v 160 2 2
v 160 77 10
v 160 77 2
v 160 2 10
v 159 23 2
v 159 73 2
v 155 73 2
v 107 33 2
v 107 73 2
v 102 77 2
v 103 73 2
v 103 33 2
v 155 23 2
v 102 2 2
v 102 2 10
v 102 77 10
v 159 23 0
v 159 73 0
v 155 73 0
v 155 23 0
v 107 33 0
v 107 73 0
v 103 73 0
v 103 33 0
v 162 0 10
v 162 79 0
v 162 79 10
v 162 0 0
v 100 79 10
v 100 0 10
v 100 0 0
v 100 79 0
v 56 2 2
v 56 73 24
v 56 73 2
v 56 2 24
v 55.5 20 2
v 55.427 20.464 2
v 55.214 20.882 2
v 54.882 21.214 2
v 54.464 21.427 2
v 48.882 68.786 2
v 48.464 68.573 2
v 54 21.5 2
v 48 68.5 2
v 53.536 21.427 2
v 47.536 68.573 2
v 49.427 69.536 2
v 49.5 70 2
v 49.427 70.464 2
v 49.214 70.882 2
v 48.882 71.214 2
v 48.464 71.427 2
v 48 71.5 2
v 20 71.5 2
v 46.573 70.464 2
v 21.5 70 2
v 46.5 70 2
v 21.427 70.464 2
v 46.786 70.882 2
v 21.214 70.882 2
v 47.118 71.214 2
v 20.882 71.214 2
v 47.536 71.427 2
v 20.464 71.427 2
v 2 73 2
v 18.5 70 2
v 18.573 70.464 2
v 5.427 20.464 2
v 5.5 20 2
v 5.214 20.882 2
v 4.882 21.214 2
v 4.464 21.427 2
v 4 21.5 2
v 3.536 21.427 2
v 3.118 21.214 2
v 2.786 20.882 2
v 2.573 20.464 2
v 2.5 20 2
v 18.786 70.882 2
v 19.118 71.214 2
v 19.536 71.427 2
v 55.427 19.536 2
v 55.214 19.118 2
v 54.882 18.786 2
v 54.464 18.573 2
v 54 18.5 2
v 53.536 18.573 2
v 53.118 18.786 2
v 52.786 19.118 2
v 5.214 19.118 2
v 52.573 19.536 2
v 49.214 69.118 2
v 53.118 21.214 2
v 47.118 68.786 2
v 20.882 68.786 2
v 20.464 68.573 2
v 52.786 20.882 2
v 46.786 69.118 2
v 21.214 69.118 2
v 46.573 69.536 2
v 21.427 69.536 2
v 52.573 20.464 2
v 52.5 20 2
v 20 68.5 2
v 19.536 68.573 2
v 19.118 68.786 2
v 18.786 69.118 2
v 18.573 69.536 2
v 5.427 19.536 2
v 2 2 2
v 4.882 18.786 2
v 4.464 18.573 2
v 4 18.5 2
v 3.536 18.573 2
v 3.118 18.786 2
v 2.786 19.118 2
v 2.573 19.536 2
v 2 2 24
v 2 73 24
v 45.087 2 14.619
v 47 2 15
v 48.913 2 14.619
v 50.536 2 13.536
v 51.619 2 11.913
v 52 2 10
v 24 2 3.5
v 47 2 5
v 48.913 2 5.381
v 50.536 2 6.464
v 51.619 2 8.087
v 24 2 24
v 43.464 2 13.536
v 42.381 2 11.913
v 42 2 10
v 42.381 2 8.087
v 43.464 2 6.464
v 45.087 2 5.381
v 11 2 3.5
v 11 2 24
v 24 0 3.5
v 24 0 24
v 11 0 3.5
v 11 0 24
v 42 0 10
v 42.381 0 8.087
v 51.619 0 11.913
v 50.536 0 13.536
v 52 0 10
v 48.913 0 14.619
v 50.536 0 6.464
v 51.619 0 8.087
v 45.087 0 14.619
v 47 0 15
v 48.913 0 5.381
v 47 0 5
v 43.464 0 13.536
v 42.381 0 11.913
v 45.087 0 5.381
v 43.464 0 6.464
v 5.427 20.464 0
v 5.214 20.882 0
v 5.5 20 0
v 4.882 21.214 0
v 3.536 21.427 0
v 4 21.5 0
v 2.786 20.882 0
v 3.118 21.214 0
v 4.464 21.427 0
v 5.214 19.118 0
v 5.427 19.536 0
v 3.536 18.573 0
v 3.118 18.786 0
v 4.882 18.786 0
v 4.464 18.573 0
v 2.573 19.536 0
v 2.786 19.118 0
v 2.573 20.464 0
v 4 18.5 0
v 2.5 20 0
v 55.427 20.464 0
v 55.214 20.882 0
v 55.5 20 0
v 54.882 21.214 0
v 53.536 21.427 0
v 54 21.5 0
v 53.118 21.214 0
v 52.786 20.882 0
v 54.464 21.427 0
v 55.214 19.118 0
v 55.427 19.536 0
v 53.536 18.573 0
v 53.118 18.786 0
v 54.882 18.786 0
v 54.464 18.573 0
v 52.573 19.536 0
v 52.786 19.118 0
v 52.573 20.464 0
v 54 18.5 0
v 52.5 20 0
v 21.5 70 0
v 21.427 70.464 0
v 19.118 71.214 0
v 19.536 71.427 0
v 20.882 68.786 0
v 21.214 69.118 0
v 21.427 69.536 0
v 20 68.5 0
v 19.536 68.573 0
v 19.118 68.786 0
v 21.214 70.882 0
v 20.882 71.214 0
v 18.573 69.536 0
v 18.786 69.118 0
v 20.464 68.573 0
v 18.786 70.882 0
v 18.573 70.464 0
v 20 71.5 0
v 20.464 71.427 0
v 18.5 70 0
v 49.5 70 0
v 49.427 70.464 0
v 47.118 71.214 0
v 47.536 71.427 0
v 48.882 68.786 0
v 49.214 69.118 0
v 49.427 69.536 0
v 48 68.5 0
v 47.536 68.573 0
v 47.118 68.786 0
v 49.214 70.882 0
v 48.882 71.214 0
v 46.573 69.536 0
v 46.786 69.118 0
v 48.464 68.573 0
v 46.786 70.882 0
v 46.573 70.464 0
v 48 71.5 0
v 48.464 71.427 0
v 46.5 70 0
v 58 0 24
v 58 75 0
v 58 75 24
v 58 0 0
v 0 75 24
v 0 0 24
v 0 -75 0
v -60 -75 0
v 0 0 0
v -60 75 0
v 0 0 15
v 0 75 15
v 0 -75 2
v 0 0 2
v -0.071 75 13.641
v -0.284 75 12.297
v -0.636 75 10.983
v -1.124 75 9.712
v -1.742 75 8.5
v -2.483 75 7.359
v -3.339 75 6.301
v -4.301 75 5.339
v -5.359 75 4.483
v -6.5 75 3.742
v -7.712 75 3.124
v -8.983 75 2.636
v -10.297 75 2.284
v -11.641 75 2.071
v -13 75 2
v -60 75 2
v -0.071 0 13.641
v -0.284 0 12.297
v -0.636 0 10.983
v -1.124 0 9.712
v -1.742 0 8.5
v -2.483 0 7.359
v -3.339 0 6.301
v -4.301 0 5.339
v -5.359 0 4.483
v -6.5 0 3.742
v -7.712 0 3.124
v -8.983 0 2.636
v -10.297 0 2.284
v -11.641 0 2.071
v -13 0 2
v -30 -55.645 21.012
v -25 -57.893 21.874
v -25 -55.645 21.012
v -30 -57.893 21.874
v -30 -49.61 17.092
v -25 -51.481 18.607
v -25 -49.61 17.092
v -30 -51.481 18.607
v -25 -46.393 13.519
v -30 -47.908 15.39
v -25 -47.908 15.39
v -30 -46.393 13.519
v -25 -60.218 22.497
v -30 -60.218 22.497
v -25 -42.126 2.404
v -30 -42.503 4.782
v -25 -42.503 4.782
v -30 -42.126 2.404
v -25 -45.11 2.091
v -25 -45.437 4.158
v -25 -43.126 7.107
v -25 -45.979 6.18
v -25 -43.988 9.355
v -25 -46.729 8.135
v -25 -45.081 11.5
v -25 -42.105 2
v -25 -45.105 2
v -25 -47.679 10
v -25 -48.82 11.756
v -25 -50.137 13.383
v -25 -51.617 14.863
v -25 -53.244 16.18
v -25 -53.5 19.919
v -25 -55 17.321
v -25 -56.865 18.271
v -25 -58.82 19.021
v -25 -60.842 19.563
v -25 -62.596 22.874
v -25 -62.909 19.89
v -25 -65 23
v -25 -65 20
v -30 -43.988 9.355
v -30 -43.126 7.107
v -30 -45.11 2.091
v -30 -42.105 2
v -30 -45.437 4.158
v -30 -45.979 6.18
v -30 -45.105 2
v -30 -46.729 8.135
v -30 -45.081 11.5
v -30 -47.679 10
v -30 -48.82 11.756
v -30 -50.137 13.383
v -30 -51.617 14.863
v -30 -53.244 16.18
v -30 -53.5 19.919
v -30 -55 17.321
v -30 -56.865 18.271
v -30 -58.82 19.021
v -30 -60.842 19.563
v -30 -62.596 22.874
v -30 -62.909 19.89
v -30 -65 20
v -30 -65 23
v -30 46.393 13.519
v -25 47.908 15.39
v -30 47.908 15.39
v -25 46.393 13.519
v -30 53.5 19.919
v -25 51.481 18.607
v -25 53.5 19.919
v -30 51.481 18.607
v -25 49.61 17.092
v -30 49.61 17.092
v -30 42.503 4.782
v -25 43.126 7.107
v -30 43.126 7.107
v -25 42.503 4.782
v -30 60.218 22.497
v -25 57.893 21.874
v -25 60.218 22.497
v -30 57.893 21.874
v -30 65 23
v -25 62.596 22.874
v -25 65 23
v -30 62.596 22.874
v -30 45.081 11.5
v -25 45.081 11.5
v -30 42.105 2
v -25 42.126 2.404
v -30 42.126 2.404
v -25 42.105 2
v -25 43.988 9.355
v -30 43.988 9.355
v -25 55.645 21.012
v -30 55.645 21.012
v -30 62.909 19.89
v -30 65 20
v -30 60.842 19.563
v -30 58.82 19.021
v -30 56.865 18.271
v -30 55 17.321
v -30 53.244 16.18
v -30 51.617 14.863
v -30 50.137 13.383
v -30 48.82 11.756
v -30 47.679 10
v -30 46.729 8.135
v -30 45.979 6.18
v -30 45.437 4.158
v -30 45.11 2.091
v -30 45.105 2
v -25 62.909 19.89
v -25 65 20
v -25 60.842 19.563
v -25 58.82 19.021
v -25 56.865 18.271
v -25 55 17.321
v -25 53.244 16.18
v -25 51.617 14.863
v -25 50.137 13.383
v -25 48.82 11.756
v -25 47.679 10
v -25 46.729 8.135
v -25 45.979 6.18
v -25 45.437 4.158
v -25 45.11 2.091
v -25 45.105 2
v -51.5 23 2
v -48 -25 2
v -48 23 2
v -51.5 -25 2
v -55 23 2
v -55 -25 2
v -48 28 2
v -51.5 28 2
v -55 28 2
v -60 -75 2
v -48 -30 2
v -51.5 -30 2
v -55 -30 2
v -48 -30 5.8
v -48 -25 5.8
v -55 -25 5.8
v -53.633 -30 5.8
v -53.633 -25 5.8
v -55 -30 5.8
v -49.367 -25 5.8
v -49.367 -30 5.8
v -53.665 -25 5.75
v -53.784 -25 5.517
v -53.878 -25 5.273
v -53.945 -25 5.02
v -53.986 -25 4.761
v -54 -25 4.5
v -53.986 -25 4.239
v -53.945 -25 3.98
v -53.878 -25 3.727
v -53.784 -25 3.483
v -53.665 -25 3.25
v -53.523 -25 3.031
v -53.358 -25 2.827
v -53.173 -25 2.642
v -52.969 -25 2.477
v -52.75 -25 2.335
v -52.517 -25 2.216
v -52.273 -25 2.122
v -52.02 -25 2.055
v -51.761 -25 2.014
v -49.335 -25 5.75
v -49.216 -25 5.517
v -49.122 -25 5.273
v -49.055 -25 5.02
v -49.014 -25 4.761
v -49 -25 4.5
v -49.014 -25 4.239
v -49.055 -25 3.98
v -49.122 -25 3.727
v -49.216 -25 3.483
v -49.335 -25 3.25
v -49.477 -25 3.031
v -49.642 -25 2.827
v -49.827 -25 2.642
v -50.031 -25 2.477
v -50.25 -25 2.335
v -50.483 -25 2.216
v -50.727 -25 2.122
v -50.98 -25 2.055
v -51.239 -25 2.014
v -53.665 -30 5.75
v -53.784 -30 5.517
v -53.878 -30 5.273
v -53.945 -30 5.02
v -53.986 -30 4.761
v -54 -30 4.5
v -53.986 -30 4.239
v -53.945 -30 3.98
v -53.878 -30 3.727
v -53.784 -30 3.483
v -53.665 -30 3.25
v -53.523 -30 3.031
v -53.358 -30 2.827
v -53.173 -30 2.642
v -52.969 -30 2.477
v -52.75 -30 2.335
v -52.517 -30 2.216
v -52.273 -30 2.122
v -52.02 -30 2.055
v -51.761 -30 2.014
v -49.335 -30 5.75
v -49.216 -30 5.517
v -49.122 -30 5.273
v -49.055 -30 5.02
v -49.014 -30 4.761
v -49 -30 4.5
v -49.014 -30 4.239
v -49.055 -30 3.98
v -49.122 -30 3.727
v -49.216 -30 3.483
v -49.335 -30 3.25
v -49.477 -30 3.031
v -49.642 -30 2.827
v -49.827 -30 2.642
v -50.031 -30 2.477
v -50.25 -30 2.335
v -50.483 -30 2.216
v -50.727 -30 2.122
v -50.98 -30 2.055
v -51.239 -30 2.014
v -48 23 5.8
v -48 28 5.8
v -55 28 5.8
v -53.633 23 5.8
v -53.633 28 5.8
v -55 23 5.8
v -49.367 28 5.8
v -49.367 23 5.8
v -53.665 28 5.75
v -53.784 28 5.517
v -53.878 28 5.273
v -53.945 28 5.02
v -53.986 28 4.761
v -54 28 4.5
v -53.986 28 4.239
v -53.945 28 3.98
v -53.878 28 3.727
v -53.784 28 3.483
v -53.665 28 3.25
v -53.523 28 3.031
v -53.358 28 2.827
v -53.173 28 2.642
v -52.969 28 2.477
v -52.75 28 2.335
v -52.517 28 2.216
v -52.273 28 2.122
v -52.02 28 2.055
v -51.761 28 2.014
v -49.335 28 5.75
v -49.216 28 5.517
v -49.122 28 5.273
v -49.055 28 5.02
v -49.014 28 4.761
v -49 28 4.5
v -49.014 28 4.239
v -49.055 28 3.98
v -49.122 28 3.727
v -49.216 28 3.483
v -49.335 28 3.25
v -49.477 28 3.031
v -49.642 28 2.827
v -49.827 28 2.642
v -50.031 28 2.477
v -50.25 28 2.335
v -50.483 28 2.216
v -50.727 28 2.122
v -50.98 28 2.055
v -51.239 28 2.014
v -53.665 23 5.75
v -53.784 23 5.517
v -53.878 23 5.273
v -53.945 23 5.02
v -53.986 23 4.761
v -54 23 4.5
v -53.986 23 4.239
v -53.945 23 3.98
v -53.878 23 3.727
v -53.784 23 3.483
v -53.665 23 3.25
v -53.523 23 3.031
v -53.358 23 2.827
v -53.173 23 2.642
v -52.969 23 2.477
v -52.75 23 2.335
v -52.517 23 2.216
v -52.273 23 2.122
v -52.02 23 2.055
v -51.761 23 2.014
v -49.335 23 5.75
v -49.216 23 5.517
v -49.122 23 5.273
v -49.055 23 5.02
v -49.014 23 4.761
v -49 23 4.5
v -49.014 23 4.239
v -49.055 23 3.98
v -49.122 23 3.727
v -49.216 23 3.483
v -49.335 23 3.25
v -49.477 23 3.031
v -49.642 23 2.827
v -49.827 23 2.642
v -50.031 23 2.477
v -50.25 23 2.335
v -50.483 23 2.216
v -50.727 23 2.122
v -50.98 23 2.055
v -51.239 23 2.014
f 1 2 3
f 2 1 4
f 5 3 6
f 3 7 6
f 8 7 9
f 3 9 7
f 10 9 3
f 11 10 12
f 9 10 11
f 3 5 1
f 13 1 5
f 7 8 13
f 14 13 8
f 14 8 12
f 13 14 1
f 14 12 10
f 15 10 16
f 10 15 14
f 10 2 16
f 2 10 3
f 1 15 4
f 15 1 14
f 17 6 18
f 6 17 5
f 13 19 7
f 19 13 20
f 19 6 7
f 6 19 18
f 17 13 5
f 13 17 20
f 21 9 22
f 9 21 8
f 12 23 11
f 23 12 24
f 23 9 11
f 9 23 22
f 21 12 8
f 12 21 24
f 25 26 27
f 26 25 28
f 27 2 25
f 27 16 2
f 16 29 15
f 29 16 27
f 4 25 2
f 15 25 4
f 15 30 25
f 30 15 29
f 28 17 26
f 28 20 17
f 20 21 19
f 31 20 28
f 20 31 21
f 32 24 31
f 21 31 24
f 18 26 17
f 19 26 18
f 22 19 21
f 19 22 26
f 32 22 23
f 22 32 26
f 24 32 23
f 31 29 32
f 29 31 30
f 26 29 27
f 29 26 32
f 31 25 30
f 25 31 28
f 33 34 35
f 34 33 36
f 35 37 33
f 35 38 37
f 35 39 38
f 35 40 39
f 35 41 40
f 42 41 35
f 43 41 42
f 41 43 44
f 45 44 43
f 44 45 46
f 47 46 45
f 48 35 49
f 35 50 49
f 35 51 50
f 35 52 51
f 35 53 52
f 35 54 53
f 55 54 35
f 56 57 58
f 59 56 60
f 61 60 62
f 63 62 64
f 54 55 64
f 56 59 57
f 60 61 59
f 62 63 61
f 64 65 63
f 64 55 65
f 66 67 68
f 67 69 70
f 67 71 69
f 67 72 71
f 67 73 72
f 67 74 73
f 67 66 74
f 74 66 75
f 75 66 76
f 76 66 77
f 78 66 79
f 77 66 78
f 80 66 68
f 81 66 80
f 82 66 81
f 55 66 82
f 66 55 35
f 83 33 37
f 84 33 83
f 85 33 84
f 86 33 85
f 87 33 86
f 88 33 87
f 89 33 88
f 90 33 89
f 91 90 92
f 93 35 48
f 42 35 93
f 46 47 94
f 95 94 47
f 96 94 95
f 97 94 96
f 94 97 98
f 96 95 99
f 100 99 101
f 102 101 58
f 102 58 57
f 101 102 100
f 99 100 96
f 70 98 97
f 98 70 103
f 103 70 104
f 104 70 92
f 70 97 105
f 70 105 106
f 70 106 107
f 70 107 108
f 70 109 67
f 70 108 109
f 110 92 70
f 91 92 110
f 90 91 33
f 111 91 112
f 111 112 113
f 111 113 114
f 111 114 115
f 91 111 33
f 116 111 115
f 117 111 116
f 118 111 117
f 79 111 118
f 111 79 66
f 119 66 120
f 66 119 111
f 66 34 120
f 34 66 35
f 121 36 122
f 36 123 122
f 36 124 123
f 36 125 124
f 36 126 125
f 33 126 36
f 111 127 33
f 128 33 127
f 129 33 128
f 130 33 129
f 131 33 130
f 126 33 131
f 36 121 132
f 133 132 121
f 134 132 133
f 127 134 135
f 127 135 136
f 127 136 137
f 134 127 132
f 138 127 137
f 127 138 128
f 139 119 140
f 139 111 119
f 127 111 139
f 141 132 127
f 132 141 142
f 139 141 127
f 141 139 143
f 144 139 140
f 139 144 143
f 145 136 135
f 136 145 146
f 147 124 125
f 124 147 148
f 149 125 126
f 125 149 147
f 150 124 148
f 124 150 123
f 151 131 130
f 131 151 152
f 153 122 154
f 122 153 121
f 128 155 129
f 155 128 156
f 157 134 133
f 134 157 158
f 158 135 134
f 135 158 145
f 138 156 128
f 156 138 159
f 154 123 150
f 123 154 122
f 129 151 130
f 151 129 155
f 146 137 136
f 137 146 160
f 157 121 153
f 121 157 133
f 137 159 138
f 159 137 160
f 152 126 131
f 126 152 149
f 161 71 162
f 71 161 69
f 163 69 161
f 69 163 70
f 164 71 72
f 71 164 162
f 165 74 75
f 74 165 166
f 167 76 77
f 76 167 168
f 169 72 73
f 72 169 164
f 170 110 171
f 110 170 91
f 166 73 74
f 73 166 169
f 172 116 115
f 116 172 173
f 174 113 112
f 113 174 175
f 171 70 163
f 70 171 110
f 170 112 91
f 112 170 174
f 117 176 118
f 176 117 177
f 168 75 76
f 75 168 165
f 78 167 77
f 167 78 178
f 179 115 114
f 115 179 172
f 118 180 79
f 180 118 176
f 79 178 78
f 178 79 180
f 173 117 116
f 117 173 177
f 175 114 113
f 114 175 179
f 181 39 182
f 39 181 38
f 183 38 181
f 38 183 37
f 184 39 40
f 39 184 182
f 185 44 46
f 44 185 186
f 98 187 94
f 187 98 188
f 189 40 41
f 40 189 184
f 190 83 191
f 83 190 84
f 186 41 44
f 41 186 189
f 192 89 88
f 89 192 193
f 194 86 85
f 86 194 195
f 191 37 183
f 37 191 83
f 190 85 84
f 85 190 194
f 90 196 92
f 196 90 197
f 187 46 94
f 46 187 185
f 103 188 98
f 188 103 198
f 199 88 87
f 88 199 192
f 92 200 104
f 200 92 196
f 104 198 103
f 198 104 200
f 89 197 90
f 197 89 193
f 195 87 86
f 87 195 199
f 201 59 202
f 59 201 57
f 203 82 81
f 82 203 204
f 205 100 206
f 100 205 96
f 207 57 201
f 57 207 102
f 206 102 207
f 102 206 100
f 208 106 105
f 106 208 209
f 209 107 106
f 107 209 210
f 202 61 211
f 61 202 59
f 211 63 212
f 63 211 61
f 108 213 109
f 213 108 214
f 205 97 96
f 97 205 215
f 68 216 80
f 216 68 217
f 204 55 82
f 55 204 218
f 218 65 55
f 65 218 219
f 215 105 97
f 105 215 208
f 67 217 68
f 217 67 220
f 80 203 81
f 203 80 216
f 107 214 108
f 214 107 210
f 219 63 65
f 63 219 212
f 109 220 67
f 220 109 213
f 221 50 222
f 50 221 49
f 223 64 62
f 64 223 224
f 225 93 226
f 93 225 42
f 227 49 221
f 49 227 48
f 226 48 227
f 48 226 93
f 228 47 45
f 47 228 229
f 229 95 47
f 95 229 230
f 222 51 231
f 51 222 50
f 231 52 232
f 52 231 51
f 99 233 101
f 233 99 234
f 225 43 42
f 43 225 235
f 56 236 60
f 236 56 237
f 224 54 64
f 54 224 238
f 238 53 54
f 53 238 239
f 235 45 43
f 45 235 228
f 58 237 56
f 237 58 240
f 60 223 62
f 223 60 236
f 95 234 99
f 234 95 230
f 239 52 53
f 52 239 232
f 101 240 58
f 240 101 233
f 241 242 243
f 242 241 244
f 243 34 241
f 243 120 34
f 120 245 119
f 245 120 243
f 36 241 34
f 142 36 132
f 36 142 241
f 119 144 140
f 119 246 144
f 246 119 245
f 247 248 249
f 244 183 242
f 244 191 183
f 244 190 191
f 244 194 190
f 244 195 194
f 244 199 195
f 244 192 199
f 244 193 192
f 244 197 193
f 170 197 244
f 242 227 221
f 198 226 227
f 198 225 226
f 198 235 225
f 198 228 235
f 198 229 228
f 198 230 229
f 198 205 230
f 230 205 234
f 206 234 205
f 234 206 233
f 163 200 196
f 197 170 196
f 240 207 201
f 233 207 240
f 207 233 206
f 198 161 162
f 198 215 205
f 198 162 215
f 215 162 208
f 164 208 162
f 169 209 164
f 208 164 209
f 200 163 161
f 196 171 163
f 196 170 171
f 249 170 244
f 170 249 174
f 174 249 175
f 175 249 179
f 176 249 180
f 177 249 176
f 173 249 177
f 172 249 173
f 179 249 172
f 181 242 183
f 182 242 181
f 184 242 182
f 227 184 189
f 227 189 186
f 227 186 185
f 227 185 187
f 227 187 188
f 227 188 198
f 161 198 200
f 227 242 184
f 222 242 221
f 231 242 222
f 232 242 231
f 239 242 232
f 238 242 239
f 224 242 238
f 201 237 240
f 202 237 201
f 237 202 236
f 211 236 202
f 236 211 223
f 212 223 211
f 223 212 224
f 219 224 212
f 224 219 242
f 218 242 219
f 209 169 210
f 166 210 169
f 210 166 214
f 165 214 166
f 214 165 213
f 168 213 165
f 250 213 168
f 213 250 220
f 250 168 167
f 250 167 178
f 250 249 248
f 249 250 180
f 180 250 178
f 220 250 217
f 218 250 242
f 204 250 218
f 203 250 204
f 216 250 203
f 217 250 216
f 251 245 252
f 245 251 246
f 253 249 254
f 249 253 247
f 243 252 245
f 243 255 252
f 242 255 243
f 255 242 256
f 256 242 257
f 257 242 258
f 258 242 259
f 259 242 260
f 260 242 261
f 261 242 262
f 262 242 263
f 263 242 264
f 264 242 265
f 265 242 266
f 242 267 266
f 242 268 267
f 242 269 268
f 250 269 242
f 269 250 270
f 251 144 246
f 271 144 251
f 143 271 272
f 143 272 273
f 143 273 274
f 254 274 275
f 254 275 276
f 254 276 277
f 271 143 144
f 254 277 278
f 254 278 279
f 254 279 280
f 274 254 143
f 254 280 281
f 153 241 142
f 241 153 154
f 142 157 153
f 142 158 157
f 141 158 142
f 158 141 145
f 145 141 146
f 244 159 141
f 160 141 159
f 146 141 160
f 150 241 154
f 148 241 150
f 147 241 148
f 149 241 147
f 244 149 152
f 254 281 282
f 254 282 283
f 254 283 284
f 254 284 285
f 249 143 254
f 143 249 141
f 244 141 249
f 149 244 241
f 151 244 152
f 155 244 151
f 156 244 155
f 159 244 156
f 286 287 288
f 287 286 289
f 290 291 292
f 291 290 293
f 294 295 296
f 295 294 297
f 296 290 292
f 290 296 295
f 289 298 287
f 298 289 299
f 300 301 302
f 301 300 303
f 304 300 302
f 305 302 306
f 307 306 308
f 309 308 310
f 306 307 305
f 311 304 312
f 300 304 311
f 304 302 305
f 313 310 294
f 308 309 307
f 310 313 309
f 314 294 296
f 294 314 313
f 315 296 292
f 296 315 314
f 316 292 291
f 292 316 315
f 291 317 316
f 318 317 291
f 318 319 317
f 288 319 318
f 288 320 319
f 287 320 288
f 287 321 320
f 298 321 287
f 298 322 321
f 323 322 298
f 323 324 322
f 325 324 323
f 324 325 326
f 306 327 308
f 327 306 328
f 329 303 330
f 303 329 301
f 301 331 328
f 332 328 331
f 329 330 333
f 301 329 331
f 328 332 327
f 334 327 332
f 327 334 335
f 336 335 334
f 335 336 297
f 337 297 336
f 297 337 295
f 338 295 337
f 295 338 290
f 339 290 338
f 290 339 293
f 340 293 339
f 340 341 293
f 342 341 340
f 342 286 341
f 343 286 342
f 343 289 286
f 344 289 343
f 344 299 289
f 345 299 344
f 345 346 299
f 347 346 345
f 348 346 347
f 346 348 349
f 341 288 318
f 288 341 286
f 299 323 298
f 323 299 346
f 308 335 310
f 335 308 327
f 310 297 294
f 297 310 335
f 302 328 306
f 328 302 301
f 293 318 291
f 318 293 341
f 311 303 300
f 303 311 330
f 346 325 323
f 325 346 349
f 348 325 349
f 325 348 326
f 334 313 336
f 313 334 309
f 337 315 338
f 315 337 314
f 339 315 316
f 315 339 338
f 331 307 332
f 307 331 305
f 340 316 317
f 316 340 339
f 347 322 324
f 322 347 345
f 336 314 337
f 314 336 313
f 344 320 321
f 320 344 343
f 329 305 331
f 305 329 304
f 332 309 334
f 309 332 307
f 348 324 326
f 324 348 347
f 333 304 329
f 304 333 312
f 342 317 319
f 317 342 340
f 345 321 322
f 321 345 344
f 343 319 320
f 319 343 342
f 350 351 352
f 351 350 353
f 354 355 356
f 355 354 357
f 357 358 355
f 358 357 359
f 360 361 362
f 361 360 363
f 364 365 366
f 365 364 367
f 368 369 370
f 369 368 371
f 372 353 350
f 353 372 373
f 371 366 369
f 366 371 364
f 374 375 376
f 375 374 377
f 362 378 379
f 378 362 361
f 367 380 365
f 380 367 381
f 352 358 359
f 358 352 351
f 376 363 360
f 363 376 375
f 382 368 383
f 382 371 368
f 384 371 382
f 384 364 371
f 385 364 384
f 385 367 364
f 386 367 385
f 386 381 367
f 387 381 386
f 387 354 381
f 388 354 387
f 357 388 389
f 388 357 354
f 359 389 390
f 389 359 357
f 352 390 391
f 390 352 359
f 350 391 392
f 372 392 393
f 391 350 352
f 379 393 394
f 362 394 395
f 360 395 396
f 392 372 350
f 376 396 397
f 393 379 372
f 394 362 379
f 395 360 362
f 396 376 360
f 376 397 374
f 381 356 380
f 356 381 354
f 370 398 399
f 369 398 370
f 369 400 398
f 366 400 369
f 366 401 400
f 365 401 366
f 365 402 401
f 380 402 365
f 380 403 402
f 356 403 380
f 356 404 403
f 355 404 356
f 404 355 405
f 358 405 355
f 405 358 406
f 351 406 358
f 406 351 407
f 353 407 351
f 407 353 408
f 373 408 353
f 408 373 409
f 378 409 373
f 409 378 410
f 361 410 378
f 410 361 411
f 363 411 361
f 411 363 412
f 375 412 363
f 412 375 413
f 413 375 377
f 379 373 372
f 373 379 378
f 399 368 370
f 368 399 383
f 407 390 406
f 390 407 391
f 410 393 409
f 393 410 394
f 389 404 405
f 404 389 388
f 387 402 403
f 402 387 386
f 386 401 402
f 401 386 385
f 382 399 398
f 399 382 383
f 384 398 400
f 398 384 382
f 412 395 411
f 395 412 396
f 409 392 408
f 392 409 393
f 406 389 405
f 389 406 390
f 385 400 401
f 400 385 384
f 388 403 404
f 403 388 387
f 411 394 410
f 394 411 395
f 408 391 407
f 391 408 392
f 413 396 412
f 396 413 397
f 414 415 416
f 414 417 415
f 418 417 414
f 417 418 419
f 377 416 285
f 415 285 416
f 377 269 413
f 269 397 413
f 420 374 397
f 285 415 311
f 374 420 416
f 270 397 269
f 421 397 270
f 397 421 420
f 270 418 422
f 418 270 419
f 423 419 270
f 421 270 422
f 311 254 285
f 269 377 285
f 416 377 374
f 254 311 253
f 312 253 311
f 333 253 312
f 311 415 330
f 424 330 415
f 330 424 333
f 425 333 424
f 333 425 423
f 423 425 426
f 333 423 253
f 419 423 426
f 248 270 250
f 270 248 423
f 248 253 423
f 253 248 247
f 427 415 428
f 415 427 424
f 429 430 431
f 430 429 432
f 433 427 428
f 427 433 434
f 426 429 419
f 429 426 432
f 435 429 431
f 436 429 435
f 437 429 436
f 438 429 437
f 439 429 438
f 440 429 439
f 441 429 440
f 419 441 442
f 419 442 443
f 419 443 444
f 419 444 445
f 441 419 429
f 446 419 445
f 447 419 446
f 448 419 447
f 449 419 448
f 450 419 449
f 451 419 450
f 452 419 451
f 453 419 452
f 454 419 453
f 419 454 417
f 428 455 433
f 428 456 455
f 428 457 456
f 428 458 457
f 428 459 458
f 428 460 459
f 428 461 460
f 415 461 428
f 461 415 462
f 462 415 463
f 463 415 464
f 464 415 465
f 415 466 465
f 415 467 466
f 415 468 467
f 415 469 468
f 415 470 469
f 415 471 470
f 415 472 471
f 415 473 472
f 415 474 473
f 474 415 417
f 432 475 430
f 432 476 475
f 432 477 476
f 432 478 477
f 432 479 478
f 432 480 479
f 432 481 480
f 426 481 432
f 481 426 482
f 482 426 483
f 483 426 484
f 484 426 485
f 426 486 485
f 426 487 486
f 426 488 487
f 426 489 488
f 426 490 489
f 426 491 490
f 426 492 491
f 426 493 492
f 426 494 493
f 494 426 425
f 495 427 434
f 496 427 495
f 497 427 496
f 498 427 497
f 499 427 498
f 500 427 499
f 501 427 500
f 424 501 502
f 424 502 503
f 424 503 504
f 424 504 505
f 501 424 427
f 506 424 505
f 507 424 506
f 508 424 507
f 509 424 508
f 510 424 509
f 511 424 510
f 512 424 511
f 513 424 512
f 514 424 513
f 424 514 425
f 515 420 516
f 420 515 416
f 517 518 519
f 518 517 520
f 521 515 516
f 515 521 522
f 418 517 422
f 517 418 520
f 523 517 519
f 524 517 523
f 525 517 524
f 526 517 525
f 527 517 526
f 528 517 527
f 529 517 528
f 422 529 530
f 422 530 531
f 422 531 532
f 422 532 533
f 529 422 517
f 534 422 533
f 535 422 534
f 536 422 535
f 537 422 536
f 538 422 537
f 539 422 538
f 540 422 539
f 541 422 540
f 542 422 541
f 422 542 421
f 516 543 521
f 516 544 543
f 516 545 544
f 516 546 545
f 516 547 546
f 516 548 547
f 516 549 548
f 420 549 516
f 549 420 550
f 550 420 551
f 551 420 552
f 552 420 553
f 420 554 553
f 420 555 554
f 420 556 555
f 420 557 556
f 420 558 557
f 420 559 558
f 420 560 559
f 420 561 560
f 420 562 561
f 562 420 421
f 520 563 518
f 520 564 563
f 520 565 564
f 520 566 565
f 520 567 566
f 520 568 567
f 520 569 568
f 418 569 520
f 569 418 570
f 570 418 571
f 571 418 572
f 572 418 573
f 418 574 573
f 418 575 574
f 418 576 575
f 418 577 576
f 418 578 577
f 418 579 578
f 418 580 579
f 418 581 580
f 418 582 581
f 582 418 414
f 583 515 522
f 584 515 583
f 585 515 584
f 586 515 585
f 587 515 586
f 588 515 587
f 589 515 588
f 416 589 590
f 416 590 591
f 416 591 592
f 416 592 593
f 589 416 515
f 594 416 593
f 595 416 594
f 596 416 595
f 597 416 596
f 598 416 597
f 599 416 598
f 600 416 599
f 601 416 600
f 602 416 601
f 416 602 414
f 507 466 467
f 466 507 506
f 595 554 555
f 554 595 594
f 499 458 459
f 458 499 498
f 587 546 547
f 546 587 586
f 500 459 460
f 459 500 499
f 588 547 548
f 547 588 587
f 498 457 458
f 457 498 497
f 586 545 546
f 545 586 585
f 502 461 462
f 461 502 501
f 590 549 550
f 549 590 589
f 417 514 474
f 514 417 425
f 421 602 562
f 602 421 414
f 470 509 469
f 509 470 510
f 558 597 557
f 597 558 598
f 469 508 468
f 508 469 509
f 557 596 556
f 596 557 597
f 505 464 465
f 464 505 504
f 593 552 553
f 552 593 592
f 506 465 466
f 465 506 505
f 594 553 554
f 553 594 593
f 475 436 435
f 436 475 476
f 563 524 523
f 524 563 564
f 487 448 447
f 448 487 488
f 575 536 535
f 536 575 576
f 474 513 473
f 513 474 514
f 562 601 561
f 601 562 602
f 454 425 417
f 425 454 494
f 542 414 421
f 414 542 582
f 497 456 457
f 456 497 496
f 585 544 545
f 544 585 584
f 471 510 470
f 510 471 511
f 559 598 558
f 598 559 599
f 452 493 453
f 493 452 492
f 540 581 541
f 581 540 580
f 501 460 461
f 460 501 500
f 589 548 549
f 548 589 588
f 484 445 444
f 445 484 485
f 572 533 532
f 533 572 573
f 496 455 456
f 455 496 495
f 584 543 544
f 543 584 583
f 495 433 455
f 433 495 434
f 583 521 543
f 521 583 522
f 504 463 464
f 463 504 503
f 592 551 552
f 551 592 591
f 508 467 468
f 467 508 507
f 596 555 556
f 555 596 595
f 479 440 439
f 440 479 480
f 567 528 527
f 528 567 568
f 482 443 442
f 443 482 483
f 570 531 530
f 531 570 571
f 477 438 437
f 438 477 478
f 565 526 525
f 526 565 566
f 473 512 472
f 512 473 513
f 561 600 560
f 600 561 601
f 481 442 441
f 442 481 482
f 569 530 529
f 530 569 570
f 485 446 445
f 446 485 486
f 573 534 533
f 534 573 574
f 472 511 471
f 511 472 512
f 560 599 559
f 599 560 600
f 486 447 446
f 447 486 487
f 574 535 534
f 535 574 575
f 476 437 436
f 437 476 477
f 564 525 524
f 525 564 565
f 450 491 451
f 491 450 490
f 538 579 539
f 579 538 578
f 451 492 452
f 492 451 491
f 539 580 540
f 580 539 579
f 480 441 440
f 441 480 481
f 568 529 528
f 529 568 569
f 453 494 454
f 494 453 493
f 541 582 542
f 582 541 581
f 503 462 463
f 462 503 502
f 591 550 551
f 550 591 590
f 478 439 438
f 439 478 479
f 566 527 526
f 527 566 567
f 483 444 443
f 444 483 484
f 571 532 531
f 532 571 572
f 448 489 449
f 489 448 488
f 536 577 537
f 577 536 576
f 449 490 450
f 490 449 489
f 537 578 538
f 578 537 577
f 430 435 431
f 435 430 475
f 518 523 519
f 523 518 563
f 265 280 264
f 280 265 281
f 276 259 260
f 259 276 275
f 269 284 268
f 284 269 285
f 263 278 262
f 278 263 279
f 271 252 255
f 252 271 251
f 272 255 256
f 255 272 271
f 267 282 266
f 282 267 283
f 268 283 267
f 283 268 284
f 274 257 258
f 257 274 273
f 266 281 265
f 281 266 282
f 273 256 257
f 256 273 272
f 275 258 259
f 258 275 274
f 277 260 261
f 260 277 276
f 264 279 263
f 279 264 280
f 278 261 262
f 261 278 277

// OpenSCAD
wall = 2;
w = 54;
d = 71;
h = 20;

translate([100,0,0]){ // top of the case
    difference(){
        cube(size = [w+(4*wall),d+(4*wall),10]);
        
        union(){
            union(){
                translate([2,2,2]){
                    cube(size = [w+(2*wall),d+(2*wall),10]);
                }
                translate([w+wall-1,23,-1]){
                    cube(size = [4,50, 5]);
                }
            }
            translate([wall+1,33,-1]){
                cube(size = [4,40, 5]);
            }
        }
    }
}
difference(){ // main case (no top, no cable manager)
    cube(size = [w+(2*wall),d+(2*wall),h+(2*wall)]); // main  box
    union(){
        union(){
            union(){
                union(){
                    union(){
                        union(){
                            translate([wall,wall,wall]){ // thickness of the walls
                                cube(size = [w,d,h+(2*wall)]); // inner cube
                            }
                            translate([9+wall,-1,1.5 + wall]){ // usb hole
                                cube(size = [13,13,21]);
                            }
                        }
                        translate([45+wall,6,8+wall]){ // charger hall
                            rotate([90,0,0]){
                                cylinder(h=8, r1=5, r2=5);
                                }
                            }
                    }
                    translate([2+wall,18 + wall,-1]){ // bottom left hole
                        cylinder(h=7, r1=1.5, r2=1.5, $fn=20);
                    }
                }
                translate([52+ wall,18 + wall,-1]){ // bottom right hole
                    cylinder(h=7, r1=1.5, r2=1.5, $fn=20);
                }
            }
            translate([18+wall,68 + wall,-1]){ // top left hole
                cylinder(h=7, r1=1.5, r2=1.5, $fn=20);
            }
        }
        translate([46 + wall,68 + wall,-1]){ // top right hole
            cylinder(h=7, r1=1.5, r2=1.5, $fn=20);
        }
    }
}
translate([0,-75,0]){ // Cable manager
    union(){
        union(){
            translate([-60,0,0]){//floor of the cable manager
                cube(size = [60,150,wall]);
            }

            union(){
                difference(){ // bottom hindge
                    intersection(){
                        translate([-30,10,0]){
                            rotate([0,90,0]){
                                cylinder(h = 5, r1 = 23, r2 = 23,$fn=60);
                            }
                        }

                        translate([-30,10,0]){
                            cube(23);
                        }
                    }
                    
                    translate([-31,10,0]){
                            rotate([0,90,0]){
                                cylinder(h = 7, r1 = 20, r2 = 20,$fn=60);
                            }
                        }
                }

                difference(){ // top hindge
                    intersection(){
                        translate([-30,140,0]){
                            rotate([0,90,0]){
                                cylinder(h = 5, r1 = 23, r2 = 23,$fn=60);
                            }
                        }

                        translate([-30,117,0]){
                            cube(23);
                        }
                    }
                    translate([-31,140,0]){
                        rotate([0,90,0]){
                            cylinder(h = 7, r1 = 20, r2 = 20,$fn=60);
                        }
                    }
                }
            }
        }
        
        difference(){ // cable holders
            union(){
                translate([-55,45,0]){
                    cube(size = [7,5,5.8]);
                }
                
                translate([-55,98,0]){
                    cube(size = [7,5,5.8]);
                }
            }
            
            translate([-51.5,120,4.5]){
                rotate([90,0,0]){
                    cylinder(h = 100, r1 = 2.5, r2 = 2.5, $fn = 60);
                }
            }
        }
        difference(){
            translate([-13,75,2]){
                cube(size = [13,75,13]);
            }
            translate([-13,151,15]){
                rotate([90,0,0]){
                    cylinder(h = 80, r1 = 13, r2 = 13, $fn = 60);
                }
            }
        }   
    }
}
